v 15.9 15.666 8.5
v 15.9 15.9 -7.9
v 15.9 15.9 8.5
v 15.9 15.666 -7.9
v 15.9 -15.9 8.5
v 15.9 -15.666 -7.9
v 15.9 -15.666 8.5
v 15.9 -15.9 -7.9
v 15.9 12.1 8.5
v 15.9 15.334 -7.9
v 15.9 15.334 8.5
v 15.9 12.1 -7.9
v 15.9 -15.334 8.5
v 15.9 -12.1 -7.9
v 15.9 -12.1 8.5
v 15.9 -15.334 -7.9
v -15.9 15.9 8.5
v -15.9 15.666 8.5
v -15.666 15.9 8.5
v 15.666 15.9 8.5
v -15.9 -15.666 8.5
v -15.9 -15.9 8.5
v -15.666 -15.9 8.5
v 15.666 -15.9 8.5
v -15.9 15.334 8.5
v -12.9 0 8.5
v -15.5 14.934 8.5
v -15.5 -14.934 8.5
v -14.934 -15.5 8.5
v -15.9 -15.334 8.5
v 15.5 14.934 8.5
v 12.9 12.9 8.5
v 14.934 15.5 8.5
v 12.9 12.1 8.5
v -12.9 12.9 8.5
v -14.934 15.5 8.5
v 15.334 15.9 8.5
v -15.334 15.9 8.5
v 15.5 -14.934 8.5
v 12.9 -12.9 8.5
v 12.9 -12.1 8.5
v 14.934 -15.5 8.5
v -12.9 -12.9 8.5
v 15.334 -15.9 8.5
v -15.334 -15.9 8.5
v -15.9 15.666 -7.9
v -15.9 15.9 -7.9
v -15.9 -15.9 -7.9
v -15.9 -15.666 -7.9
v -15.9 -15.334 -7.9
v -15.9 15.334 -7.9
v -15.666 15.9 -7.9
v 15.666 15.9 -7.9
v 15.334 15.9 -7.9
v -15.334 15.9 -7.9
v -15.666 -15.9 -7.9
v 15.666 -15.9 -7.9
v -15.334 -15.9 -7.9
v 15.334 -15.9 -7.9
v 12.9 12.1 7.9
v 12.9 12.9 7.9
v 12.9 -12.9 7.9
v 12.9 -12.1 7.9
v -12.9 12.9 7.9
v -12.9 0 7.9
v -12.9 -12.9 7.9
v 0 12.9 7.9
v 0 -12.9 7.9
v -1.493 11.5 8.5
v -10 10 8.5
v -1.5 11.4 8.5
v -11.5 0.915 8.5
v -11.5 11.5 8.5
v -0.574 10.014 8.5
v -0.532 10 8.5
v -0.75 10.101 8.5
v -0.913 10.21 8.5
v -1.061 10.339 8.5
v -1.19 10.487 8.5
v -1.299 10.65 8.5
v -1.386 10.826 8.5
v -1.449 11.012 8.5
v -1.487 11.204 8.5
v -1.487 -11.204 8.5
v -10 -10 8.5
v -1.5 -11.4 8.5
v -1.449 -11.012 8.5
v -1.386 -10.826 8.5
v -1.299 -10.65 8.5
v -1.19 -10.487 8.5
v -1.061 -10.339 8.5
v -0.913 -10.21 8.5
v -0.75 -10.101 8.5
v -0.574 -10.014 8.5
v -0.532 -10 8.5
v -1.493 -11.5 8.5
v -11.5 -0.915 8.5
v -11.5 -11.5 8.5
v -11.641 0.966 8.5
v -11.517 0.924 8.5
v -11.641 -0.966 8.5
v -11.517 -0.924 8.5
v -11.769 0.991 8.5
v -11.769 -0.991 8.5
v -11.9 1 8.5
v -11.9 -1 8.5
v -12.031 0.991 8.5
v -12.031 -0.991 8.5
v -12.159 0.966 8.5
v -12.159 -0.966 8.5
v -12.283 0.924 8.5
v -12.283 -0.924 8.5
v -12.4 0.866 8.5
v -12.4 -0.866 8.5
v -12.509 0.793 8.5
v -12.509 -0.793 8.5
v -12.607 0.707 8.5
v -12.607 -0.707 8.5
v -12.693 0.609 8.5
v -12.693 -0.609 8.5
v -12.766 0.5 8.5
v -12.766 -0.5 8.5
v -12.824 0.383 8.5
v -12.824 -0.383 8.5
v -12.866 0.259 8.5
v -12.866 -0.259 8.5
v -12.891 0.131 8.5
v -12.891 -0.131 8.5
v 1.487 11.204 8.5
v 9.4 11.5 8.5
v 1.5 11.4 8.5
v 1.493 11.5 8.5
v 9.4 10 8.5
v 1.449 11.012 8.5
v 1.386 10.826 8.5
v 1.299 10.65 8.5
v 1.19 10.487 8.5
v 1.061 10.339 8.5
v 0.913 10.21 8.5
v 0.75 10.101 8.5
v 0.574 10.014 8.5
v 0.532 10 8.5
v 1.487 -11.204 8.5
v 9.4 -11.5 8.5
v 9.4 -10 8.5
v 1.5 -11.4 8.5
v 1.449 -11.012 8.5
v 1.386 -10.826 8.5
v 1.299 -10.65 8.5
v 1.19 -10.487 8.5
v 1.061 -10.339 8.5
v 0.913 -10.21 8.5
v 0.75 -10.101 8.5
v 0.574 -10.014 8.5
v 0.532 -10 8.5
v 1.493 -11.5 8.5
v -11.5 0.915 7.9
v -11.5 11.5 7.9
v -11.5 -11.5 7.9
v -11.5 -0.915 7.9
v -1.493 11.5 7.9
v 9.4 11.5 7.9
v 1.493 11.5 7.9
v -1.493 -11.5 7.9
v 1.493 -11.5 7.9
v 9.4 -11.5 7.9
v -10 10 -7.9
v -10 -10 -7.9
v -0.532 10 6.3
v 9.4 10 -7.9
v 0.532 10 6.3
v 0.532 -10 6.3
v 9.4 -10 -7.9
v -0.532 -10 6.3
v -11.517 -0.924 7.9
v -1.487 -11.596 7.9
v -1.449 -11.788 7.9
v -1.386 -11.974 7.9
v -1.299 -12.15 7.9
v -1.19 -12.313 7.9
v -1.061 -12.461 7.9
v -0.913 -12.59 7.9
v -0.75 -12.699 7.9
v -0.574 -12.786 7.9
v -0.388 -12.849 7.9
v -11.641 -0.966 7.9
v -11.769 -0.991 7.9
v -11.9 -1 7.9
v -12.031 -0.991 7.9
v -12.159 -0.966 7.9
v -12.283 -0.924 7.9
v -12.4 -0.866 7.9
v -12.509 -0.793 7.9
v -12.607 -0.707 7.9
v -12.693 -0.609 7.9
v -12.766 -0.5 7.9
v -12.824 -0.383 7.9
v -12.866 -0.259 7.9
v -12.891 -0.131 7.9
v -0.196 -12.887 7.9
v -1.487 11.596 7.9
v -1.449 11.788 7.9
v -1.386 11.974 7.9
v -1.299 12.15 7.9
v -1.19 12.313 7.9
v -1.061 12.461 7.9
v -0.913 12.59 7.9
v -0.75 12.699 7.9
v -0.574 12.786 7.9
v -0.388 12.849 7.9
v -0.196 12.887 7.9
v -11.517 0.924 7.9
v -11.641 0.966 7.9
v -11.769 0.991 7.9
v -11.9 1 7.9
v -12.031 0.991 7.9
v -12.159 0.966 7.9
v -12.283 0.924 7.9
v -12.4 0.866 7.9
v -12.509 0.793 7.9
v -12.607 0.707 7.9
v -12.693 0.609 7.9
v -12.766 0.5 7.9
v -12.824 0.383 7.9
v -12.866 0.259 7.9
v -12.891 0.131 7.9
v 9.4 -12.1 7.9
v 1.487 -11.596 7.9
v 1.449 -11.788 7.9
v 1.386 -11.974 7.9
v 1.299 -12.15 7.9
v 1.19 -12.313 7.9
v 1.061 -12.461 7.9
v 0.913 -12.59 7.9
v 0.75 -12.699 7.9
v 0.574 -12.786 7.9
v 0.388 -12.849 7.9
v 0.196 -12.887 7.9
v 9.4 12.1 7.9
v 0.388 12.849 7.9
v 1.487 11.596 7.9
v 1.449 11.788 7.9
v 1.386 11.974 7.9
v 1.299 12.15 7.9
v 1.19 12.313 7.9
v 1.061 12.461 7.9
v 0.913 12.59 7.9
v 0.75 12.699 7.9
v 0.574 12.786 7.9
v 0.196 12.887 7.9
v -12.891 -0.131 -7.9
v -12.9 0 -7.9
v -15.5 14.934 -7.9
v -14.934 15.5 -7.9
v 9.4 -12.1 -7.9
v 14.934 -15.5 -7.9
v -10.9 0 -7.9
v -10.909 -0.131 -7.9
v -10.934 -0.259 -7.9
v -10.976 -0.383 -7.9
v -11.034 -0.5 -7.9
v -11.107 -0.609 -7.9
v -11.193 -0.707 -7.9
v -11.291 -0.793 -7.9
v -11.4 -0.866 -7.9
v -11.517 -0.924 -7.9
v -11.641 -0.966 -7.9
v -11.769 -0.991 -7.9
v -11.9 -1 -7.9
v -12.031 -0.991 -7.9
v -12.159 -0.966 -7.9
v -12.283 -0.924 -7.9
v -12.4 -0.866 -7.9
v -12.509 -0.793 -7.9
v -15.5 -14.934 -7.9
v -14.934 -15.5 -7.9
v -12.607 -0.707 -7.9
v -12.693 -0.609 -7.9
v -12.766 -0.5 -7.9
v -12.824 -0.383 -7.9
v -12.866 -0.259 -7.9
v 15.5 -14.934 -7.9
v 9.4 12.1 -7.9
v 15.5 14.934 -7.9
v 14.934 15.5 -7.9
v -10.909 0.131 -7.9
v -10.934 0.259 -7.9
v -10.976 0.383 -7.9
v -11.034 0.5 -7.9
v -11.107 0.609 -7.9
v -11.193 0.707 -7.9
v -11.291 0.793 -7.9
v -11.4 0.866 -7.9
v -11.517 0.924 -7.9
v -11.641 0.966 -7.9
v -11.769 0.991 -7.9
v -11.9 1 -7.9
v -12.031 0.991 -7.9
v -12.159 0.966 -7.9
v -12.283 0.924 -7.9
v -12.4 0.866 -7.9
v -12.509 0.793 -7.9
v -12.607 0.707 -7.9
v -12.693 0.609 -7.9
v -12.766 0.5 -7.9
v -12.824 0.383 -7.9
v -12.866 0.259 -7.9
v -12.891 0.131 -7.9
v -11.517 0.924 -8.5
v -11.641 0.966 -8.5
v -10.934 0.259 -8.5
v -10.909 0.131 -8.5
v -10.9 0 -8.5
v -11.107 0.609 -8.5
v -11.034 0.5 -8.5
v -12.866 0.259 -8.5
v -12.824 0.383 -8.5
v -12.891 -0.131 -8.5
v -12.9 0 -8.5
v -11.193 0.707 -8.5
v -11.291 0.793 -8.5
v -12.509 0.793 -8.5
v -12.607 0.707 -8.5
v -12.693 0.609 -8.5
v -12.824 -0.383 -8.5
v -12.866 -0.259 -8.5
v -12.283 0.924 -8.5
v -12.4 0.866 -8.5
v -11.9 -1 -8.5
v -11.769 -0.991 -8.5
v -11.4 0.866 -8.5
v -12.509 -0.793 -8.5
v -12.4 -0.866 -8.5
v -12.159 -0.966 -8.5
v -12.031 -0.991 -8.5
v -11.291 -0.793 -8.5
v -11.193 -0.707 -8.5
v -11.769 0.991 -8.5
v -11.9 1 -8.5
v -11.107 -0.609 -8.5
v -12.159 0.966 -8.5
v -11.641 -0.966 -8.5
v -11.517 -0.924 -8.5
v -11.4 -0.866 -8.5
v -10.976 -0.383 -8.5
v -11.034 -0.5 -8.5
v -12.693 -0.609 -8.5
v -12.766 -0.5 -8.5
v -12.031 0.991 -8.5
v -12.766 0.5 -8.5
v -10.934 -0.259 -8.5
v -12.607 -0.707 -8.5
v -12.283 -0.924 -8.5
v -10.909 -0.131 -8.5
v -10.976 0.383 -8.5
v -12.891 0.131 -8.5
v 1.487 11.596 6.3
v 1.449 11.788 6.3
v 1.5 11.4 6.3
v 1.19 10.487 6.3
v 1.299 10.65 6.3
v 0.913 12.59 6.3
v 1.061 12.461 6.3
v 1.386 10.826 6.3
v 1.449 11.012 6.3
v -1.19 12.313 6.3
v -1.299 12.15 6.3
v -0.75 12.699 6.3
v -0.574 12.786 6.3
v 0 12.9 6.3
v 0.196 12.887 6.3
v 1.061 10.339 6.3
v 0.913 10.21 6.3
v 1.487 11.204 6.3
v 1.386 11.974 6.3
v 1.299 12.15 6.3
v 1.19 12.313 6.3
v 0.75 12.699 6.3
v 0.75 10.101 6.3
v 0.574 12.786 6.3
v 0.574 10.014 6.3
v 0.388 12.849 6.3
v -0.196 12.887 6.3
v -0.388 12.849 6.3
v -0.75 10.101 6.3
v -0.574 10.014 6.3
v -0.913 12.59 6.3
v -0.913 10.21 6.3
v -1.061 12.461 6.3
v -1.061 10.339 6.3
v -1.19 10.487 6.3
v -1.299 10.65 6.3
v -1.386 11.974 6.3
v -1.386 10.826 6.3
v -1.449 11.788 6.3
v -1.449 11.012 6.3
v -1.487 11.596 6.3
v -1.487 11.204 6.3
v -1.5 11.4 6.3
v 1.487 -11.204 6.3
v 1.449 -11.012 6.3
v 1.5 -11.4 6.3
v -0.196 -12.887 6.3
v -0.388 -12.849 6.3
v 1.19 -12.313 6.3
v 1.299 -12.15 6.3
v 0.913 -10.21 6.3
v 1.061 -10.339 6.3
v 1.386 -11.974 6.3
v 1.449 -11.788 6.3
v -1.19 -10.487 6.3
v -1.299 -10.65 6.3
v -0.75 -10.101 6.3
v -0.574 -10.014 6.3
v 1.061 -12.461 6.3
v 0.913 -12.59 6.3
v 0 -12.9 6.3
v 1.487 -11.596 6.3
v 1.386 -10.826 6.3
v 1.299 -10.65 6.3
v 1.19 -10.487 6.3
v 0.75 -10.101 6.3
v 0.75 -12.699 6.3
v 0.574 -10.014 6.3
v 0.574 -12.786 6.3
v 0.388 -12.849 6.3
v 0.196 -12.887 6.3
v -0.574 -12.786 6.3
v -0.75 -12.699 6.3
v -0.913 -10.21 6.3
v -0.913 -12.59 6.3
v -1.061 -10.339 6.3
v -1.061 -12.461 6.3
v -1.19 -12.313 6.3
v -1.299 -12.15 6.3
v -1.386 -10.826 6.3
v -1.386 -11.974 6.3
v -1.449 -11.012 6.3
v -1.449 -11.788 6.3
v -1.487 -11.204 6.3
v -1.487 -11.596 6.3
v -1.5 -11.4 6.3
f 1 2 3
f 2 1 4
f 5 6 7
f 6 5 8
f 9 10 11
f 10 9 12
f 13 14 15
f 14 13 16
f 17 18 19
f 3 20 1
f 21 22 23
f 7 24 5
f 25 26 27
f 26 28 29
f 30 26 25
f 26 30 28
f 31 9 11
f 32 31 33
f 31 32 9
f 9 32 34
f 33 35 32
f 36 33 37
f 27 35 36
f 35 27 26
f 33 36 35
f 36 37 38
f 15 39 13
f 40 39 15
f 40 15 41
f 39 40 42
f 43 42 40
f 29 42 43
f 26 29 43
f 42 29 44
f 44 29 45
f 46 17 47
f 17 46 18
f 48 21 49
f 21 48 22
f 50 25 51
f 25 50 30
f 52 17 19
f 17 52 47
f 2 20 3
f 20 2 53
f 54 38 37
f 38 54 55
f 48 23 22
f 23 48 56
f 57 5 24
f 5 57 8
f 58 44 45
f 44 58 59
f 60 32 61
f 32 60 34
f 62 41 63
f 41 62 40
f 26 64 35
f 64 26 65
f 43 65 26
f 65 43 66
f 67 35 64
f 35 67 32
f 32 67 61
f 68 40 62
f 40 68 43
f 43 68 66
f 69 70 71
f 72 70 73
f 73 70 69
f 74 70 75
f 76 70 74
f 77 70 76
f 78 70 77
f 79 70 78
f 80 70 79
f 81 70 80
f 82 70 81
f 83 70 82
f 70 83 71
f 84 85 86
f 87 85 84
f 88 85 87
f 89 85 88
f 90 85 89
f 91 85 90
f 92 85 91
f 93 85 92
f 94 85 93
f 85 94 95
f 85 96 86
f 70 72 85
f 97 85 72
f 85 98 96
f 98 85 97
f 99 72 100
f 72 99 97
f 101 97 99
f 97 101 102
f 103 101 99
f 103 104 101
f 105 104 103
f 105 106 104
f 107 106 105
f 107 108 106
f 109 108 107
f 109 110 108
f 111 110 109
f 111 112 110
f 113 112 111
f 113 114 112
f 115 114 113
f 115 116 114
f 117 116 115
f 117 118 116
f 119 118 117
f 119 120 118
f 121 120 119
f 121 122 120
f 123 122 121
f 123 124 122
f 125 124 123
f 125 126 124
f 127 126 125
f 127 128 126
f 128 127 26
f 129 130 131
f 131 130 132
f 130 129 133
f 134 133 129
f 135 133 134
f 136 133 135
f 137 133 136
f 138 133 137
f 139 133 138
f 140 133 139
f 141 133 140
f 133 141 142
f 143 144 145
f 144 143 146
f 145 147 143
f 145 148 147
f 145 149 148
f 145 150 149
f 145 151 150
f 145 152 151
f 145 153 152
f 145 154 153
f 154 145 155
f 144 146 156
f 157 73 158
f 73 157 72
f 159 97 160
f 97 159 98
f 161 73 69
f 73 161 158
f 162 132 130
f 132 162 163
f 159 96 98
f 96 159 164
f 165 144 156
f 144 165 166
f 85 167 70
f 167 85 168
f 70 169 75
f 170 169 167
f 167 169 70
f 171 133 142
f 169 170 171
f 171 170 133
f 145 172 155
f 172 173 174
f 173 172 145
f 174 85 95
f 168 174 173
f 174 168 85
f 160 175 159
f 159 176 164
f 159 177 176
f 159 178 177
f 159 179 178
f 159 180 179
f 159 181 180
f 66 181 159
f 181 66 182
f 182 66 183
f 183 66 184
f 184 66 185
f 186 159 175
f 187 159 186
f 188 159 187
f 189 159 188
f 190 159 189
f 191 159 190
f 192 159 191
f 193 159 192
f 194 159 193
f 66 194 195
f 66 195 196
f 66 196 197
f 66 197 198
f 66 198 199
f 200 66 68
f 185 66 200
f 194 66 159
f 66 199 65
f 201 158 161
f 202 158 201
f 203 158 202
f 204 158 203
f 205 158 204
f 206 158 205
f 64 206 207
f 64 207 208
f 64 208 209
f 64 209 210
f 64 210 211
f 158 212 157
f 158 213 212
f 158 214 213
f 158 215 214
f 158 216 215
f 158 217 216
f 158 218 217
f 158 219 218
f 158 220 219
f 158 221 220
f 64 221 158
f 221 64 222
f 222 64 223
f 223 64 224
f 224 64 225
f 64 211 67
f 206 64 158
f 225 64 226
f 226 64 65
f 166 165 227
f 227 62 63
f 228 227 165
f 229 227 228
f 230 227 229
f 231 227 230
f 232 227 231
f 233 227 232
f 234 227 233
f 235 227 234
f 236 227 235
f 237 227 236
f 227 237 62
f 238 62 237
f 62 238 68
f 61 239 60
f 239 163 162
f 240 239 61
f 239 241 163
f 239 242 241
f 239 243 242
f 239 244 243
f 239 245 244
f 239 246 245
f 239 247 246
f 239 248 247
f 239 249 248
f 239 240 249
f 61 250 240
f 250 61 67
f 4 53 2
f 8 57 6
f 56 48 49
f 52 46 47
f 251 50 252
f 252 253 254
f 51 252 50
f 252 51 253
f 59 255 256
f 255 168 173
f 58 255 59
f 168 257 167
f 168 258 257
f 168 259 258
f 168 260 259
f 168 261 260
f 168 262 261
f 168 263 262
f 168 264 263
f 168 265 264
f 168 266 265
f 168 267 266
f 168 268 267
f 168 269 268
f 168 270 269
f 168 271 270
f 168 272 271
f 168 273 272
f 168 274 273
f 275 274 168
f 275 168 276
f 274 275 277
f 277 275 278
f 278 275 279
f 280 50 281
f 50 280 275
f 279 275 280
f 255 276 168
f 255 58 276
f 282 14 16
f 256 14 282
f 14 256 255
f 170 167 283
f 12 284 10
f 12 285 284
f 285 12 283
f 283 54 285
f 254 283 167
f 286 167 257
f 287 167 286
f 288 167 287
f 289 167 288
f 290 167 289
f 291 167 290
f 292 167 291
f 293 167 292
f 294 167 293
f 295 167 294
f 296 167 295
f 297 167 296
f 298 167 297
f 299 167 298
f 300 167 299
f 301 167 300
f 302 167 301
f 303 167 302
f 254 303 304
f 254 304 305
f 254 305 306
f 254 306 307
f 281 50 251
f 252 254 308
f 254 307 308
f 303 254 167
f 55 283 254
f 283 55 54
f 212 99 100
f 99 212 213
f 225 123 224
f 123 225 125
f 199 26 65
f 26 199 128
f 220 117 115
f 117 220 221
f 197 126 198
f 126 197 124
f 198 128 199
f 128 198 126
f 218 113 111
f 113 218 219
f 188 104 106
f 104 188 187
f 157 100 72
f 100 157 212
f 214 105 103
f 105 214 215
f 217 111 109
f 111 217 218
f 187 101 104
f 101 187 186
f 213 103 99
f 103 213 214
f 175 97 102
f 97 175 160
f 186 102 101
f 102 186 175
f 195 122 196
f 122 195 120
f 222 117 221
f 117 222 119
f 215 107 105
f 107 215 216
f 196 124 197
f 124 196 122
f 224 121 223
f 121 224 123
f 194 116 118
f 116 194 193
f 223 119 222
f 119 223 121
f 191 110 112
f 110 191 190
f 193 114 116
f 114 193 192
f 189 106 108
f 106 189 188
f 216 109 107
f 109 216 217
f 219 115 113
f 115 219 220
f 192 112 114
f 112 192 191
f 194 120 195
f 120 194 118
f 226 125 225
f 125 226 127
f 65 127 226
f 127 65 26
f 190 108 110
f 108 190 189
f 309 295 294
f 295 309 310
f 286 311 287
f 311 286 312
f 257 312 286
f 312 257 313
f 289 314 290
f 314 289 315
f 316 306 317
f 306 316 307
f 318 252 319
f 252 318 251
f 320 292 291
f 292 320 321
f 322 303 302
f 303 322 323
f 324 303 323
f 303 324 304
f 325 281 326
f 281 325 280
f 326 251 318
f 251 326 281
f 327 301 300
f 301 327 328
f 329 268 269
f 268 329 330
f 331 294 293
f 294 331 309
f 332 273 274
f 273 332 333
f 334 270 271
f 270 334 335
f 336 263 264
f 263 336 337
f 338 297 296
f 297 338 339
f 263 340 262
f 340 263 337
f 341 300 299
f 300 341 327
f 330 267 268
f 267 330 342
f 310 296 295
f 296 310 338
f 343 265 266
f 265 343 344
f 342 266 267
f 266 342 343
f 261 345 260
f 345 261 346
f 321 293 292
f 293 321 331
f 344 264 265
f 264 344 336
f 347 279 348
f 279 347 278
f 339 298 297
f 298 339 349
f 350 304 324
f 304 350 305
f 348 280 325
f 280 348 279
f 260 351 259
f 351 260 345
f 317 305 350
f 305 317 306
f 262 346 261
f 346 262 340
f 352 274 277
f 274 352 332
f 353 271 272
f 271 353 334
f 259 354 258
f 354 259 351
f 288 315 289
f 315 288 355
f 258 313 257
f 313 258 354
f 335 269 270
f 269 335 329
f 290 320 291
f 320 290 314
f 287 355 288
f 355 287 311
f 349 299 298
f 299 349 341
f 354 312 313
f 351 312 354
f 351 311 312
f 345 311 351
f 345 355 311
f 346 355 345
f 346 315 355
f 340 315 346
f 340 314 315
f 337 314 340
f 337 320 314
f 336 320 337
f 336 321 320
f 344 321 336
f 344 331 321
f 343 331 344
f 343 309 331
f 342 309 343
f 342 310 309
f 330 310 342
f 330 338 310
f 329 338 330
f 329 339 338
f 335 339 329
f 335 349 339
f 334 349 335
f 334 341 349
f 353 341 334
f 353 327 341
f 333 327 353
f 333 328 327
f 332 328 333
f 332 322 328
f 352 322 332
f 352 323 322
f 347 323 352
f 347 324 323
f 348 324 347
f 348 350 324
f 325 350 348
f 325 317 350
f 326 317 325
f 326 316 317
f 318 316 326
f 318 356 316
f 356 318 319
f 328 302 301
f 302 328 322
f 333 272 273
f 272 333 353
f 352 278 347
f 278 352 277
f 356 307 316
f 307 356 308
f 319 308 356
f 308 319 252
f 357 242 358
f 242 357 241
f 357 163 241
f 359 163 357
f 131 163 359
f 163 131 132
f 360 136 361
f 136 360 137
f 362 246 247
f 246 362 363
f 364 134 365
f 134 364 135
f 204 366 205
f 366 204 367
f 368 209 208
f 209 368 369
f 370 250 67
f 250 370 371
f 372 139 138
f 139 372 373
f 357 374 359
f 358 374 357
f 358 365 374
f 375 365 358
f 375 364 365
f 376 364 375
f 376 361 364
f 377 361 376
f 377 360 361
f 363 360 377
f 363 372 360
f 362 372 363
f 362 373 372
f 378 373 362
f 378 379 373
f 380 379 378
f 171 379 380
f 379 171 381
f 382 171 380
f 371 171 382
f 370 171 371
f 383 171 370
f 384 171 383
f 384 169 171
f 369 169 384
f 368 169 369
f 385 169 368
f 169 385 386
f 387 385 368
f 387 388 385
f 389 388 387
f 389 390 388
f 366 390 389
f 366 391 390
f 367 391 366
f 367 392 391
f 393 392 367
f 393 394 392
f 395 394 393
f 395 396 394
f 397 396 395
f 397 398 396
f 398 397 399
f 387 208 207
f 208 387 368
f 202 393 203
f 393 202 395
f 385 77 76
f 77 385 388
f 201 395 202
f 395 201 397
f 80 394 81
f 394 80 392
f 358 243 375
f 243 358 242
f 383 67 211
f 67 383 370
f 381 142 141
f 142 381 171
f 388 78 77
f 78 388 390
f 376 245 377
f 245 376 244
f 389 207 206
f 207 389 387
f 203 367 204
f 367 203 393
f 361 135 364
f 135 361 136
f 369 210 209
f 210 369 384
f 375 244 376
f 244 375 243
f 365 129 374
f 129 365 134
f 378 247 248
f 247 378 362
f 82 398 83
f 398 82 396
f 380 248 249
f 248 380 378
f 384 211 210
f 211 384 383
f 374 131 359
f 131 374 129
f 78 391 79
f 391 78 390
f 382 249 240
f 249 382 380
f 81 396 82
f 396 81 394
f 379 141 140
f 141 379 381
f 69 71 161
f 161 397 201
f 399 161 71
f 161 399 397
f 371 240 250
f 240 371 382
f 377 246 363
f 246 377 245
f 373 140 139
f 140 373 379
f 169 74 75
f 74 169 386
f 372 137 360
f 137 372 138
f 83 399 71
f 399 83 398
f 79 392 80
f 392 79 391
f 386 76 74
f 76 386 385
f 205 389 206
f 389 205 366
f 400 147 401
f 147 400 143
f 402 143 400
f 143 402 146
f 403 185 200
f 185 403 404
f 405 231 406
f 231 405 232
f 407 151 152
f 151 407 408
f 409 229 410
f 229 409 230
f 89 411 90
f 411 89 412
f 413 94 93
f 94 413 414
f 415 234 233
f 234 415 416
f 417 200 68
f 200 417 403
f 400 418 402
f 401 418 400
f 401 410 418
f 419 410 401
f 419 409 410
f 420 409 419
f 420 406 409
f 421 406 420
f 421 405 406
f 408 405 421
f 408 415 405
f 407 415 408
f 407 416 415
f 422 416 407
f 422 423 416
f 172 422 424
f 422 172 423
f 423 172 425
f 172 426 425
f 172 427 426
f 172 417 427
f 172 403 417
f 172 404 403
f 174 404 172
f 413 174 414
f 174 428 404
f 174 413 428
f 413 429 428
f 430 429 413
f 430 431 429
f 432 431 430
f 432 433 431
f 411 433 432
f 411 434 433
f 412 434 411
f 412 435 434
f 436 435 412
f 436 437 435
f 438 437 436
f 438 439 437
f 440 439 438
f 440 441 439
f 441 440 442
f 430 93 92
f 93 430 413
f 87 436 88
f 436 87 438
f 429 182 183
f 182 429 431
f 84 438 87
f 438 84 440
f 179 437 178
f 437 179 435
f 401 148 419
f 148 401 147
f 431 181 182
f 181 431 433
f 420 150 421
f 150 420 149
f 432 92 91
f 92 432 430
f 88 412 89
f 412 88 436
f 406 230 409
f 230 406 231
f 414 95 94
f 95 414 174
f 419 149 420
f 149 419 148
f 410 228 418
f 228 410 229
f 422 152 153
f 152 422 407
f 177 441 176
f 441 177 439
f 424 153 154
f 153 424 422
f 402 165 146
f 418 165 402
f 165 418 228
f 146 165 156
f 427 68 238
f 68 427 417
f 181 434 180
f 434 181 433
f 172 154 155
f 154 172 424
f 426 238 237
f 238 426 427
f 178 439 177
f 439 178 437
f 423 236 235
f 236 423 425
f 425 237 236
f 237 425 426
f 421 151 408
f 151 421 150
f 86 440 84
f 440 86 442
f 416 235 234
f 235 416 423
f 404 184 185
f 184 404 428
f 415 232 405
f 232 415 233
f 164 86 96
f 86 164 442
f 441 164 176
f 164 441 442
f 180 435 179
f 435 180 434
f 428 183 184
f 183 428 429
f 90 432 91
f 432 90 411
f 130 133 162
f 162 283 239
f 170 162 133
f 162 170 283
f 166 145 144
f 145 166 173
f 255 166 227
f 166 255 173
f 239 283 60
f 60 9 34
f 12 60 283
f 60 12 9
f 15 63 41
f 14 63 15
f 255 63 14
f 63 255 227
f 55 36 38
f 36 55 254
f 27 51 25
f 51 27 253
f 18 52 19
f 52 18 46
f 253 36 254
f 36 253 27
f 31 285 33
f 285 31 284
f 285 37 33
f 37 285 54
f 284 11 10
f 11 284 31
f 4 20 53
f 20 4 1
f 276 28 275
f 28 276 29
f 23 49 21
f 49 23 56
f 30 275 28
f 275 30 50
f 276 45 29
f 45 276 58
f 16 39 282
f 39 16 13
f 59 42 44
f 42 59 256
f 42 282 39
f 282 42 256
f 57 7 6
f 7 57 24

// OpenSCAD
// Blocky C-shaped bracket/frame with stepped outer perimeter and inner step transitions
// Bounding box: 31.8 x 31.8 x 15.8 mm

// Parameters
bbox_x = 31.8;
bbox_y = 31.8;
bbox_z = 15.8;

frame_thk_z = bbox_z;

outer_step_depth = 2.0;
outer_step_margin = 3.0;

opening_x = 20.0;
opening_y = 20.0;

inner_step_depth = 1.5;
inner_step_width = 1.5;

c_gap_w = 8.0;

boss_w = 6.0;
boss_h = 6.0;
boss_z = bbox_z;
boss_inset = 0.0;

overlap = 0.6;

chamfer = 0.8;

nub_d = 2.0;
nub_h = 1.2;

relief_d = 3.0;
relief_depth = 1.0;

// Helpers
module box(sz, pos=[0,0,0]) { translate(pos) cube(sz, center=true); }
module cyl(r,h,pos=[0,0,0]) { translate(pos) cylinder(r=r, h=h, center=true, $fn=48); }

// Base solids
module outer_frame_plate() {
  box([bbox_x, bbox_y, frame_thk_z]);
}

// Outer stepped perimeter (a shallow "ring" on the top face)
module outer_perimeter_step_ring() {
  difference() {
    // slightly oversized in Z to avoid coplanar artifacts
    box([bbox_x, bbox_y, outer_step_depth + 2*overlap],
        [0,0, frame_thk_z/2 - outer_step_depth/2]);
    box([bbox_x - 2*outer_step_margin, bbox_y - 2*outer_step_margin, outer_step_depth + 4*overlap],
        [0,0, frame_thk_z/2 - outer_step_depth/2]);
  }
}

// Inner step transitions around the opening (a shallow ledge on the top face)
module inner_opening_step_ring() {
  difference() {
    box([opening_x + 2*inner_step_width, opening_y + 2*inner_step_width, inner_step_depth + 2*overlap],
        [0,0, frame_thk_z/2 - inner_step_depth/2]);
    box([opening_x, opening_y, inner_step_depth + 4*overlap],
        [0,0, frame_thk_z/2 - inner_step_depth/2]);
  }
}

// Boss pads at corners (reinforced pads)
module union_boss_pads() {
  union() {
    box([boss_w, boss_h, boss_z],
        [-bbox_x/2 + boss_w/2 + boss_inset,  bbox_y/2 - boss_h/2 - boss_inset, 0]);
    box([boss_w, boss_h, boss_z],
        [-bbox_x/2 + boss_w/2 + boss_inset, -bbox_y/2 + boss_h/2 + boss_inset, 0]);
    box([boss_w, boss_h, boss_z],
        [ bbox_x/2 - boss_w/2 - boss_inset,  bbox_y/2 - boss_h/2 - boss_inset, 0]);
    box([boss_w, boss_h, boss_z],
        [ bbox_x/2 - boss_w/2 - boss_inset, -bbox_y/2 + boss_h/2 + boss_inset, 0]);
  }
}

// Small alignment nubs (kept connected by placing on faces with slight overlap)
module union_alignment_nubs() {
  union() {
    cyl(nub_d/2, nub_h + 2*overlap,
        [-bbox_x/2 + outer_step_margin + nub_d/2, 0,  frame_thk_z/2 - nub_h/2]);
    cyl(nub_d/2, nub_h + 2*overlap,
        [-bbox_x/2 + outer_step_margin + nub_d/2, 0, -frame_thk_z/2 + nub_h/2]);
  }
}

// Subtractive features
module central_rectangular_opening() {
  box([opening_x, opening_y, frame_thk_z + 4*overlap]);
}

// C-gap that opens the inner opening to the outside on the +X side
module c_shape_side_gap() {
  // Ensure it reaches the outer boundary and overlaps slightly
  gap_len_x = (bbox_x/2 - opening_x/2) + c_gap_w + 2*overlap;
  box([gap_len_x, opening_y + 2*inner_step_width + 2*overlap, frame_thk_z + 4*overlap],
      [opening_x/2 + gap_len_x/2 - overlap, 0, 0]);
}

// Corner chamfers (small corner nips)
module chamfer_cut(pos) {
  translate(pos)
    rotate([0,0,45])
      cube([chamfer, chamfer, frame_thk_z + 4*overlap], center=true);
}

// Cosmetic reliefs on top face
module cosmetic_reliefs() {
  union() {
    cyl(relief_d/2, relief_depth + 2*overlap,
        [0,  bbox_y/2 - outer_step_margin - relief_d/2, frame_thk_z/2 - relief_depth/2]);
    cyl(relief_d/2, relief_depth + 2*overlap,
        [0, -bbox_y/2 + outer_step_margin + relief_d/2, frame_thk_z/2 - relief_depth/2]);
  }
}

// Build
module union_additive_features() {
  union() {
    outer_frame_plate();
    outer_perimeter_step_ring();
    inner_opening_step_ring();
    union_boss_pads();
    union_alignment_nubs();
  }
}

module final_part() {
  difference() {
    union_additive_features();

    // Main through opening + C-gap
    central_rectangular_opening();
    c_shape_side_gap();

    // Reliefs and chamfers
    cosmetic_reliefs();

    chamfer_cut([-bbox_x/2 + chamfer/2,  bbox_y/2 - chamfer/2, 0]);
    chamfer_cut([ bbox_x/2 - chamfer/2,  bbox_y/2 - chamfer/2, 0]);
    chamfer_cut([-bbox_x/2 + chamfer/2, -bbox_y/2 + chamfer/2, 0]);
    chamfer_cut([ bbox_x/2 - chamfer/2, -bbox_y/2 + chamfer/2, 0]);
  }
}

final_part();
